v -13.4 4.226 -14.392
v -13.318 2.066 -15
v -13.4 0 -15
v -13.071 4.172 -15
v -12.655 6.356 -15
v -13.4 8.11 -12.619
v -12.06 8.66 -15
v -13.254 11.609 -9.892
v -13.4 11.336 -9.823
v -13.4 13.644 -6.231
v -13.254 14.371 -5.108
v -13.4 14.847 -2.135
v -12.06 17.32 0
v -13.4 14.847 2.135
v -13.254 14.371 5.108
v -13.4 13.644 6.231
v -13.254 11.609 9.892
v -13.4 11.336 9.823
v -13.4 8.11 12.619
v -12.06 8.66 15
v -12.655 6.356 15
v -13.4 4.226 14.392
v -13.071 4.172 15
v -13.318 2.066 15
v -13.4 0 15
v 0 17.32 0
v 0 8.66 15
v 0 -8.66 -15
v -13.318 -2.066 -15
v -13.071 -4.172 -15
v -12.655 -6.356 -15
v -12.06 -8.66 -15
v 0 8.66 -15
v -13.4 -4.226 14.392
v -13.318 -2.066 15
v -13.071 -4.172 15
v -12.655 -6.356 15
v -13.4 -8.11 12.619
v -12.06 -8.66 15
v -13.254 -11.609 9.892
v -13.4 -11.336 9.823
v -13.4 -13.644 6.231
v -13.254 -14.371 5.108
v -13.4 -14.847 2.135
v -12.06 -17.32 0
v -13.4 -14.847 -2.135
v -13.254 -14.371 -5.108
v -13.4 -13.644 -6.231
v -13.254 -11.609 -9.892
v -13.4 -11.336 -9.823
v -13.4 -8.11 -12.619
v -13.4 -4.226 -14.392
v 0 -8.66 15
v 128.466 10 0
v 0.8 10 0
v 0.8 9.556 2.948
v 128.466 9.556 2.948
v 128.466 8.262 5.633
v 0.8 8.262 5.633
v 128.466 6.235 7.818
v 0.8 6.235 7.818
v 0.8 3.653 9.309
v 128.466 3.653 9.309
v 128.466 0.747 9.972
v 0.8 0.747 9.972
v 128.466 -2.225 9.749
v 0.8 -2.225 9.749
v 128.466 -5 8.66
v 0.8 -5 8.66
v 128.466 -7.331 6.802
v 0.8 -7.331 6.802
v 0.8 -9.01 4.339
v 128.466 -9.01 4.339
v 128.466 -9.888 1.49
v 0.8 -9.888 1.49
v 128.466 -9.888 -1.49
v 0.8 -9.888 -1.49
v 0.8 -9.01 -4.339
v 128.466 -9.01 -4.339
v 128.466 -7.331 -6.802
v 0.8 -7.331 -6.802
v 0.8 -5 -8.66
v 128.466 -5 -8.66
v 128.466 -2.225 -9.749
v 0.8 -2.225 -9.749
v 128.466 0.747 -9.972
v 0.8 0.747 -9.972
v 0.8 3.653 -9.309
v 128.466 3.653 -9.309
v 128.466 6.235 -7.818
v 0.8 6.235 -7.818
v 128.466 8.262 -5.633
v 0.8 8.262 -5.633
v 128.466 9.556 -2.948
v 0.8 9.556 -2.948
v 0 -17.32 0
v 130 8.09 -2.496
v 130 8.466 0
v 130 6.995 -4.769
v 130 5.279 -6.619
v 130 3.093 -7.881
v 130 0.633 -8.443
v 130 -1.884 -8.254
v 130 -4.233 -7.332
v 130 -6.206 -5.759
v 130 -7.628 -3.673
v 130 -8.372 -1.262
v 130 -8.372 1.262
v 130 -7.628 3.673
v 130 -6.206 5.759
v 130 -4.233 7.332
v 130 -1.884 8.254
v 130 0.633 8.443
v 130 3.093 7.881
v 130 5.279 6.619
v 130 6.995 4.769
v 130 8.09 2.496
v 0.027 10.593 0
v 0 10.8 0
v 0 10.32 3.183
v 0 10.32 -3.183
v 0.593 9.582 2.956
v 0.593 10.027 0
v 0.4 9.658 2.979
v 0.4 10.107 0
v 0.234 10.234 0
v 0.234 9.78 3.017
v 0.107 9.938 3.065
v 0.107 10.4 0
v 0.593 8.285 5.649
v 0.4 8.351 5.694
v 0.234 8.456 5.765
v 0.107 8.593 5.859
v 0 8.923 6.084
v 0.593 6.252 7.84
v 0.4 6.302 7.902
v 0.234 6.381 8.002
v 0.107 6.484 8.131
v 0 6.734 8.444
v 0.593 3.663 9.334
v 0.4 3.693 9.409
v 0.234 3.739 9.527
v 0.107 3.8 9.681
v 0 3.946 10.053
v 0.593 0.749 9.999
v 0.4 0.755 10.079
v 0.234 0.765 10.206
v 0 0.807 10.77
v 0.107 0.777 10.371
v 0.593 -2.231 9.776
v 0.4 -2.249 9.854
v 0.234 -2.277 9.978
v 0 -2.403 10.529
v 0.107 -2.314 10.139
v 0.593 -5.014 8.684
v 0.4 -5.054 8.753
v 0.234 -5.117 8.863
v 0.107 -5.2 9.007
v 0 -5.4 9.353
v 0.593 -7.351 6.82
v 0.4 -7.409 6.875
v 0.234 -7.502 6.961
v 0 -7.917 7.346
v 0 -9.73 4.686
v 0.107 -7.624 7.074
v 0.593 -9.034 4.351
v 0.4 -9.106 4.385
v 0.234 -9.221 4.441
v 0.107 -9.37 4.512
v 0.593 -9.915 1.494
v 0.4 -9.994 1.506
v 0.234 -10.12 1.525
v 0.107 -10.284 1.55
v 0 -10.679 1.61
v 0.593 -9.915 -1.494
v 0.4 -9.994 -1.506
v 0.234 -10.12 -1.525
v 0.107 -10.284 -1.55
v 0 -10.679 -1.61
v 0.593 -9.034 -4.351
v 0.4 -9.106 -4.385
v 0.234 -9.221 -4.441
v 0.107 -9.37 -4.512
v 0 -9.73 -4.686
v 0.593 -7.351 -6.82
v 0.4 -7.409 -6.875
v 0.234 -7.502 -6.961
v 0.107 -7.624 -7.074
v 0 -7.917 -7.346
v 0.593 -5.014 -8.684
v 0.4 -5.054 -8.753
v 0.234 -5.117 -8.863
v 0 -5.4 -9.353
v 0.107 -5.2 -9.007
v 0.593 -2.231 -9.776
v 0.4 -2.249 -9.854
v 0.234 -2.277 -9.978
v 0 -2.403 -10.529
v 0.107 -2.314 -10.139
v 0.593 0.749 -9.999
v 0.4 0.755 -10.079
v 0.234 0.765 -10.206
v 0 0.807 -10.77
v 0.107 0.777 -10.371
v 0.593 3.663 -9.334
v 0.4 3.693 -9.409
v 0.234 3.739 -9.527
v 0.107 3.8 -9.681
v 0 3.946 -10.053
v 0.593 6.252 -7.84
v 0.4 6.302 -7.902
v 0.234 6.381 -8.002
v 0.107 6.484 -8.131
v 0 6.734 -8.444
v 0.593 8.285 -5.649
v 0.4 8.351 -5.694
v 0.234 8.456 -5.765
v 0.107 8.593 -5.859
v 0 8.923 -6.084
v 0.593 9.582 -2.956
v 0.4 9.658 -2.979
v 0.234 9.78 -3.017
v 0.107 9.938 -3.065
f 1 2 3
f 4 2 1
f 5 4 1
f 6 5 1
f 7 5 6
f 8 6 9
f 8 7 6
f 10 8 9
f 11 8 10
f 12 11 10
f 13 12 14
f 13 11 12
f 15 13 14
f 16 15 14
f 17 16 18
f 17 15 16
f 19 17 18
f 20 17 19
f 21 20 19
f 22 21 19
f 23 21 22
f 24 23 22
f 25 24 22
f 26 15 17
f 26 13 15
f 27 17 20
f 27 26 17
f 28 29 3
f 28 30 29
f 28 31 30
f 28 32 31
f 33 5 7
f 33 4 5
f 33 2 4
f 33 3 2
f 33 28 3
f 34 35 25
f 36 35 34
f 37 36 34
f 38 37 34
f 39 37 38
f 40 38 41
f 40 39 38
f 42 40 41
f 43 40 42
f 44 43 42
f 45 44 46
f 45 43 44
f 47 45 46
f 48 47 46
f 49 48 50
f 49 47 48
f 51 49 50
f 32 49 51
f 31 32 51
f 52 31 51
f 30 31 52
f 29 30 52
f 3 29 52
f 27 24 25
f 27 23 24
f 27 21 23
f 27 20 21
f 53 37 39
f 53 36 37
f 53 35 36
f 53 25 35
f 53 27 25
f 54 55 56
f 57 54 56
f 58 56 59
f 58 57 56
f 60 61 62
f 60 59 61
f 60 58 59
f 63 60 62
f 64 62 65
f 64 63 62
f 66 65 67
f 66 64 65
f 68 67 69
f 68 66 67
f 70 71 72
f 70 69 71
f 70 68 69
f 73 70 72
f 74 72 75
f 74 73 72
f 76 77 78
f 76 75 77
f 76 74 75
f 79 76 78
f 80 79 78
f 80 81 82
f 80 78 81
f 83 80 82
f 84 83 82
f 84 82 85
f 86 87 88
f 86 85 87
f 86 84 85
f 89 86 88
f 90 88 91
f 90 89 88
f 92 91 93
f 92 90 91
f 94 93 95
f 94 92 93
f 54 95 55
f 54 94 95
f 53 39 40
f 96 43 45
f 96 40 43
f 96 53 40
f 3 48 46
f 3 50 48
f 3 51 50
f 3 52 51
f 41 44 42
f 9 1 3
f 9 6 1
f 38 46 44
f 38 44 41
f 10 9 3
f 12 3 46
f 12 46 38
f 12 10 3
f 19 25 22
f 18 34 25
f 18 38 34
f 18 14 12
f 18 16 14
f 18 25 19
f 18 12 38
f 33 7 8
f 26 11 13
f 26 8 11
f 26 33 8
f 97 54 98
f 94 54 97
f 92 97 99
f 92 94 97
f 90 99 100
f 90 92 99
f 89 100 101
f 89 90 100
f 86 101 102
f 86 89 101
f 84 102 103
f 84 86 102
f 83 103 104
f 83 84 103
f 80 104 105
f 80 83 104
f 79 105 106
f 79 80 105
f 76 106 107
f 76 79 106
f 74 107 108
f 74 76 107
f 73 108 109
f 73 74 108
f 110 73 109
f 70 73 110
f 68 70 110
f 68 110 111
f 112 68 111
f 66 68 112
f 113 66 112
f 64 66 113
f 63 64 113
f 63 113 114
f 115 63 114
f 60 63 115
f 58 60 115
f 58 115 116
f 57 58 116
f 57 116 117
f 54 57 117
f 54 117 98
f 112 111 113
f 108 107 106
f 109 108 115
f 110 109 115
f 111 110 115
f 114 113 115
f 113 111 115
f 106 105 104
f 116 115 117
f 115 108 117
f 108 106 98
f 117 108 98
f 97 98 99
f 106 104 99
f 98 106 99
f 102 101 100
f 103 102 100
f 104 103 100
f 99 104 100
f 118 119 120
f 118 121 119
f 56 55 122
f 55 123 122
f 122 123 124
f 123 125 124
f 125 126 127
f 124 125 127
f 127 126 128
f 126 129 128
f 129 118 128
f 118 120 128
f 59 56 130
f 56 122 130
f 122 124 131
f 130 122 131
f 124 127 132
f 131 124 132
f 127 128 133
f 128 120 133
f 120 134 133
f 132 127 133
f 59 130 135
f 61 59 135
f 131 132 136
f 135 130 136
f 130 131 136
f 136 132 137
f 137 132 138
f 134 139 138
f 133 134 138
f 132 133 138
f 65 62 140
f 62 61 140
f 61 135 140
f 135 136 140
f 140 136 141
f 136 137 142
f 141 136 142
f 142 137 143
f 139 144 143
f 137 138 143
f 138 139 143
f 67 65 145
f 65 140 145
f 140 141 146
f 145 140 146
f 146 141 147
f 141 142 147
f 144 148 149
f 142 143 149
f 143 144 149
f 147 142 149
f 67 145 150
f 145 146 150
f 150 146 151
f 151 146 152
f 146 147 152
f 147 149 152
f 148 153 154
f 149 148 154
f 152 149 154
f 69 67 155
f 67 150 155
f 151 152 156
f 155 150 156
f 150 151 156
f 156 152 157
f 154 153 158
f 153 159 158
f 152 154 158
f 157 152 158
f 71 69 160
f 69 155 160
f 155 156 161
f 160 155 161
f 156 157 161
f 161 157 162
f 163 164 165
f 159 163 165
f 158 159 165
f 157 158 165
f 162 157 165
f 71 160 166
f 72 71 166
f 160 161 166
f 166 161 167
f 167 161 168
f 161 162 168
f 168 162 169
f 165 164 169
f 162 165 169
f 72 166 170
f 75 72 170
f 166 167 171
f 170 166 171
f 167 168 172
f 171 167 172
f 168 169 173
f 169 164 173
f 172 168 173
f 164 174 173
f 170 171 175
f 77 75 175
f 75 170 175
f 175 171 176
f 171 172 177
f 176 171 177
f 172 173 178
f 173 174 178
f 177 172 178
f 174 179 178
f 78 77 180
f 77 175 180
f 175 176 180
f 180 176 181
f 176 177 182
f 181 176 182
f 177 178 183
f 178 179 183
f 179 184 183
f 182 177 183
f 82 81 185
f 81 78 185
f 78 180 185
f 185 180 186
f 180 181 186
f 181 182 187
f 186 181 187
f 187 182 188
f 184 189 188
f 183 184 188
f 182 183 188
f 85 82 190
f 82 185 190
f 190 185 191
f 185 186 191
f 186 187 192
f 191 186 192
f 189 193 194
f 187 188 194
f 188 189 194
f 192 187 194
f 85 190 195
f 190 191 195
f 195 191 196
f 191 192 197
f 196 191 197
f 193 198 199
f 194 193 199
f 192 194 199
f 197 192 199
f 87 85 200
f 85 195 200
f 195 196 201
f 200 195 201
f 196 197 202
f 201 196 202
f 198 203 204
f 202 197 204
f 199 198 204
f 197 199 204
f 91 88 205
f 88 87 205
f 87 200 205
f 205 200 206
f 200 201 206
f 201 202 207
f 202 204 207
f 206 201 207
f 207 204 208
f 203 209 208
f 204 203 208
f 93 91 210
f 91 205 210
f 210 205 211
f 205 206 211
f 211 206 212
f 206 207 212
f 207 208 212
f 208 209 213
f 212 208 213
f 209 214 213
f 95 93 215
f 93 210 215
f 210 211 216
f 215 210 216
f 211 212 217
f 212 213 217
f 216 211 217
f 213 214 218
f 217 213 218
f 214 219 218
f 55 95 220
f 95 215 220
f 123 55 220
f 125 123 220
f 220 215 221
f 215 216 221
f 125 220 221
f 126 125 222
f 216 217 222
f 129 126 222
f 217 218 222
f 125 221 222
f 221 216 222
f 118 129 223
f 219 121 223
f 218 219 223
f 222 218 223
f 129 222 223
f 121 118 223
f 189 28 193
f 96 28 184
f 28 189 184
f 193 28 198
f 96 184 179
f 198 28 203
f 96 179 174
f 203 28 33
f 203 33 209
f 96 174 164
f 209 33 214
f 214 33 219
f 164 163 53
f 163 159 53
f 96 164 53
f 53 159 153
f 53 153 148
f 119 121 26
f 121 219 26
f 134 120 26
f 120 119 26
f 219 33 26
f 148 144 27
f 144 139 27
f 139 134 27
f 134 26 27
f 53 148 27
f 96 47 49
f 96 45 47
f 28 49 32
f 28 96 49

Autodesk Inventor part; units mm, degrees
ref_plane "YZ Plane" through (0, 0, 0) normal (1, 0, 0) x (0, 1, 0)
ref_plane "XZ Plane" through (0, 0, 0) normal (0, 1, 0) x (-1, 0, 0)
sketch "Sketch1" plane through (0, 0, 0) normal (0, 0, 1) x (1, 0, 0)
  line L0 (0, 10) -> (130, 10)
  line L1 (130, 10) -> (130, 0)
  line L2 (130, 0) -> (0, 0)
  line L3 (-26, 0) -> (156, 0) projected
  line L4 (0, -2) -> (0, 12) projected
  line L5 (0, 10) -> (0, 0)
  dimension "d2" = 20
  dimension "d59" = 130
revolve "Body" add sketch "Sketch1" angle 360 about axis through (130, 0, 0) along (-1, 0, 0)
sketch "Sketch2" plane through (0, 0, 0) normal (-1, 0, 0) x (0, 0, 1)
  line L0 (0, 17.3205) -> (15, 8.6603)
  line L1 (15, 8.6603) -> (15, -8.6603)
  line L2 (15, -8.6603) -> (0, -17.3205)
  line L3 (0, -17.3205) -> (-15, -8.6603)
  line L4 (-15, -8.6603) -> (-15, 8.6603)
  line L5 (-15, 8.6603) -> (0, 17.3205)
  line L6 (-21, 0) -> (21, 0) projected
  line L7 (0, 24.2487) -> (0, -24.2487) projected
  point P0 (0, 0)
  point P1 (0, 0)
  dimension "d11" = 30
extrude "Head" add sketch "Sketch2" along normal blind 13.4
sketch "Sketch4" plane through (0, 0, 0) normal (0, 0, 1) x (1, 0, 0)
  line L0 (-11.6679, 18) -> (-13.4, 15)
  line L1 (-1.1, 0) -> (-0.234, 0)
  line L2 (-16.0332, 0) -> (2.3992, 0) projected
  line L3 (-13.4, 18) -> (-11.6679, 18)
  line L4 (-13.4, 15) -> (-13.4, 18)
  line L5 (0, 21.6) -> (0, -3.6) projected
  dimension "d65" = 30
  dimension "d67" = 30
  dimension "d68" = 36
  dimension "d69" = 13.4
revolve "Chamfer1" cut sketch "Sketch4" angle 360 about axis through (-1.1, 0, 0) along (1, 0, 0)
thread "Thread" size "M20x2.5" class "6g" standard "ISO Metric profile" length 52
chamfer "Chamfer2" distance 1.5336 distance2 1.5337 1 edges at (130, -10, 0) measured on face at (130, -2.6738, -2.9356)
fillet "Fillet" radius 0.8 1 edges at (0, -10, 0)
ref_plane "Work Plane1" through (1.525, 0, 0) normal (0, 0, 1) x (1, 0, 0)
equation "\"d2\" = GD"
equation "\"d59\" = NLG"
equation "\"d11\" = SW"
equation "\"d3\" = KOH"
equation "\"d15\" = GEL"
equation "\"d6\" = -0.5 * SPD + 0.5 * GD"
equation "\"d71\" = RR1"
equation "\"d65\" = SW"
equation "\"d67\" = ANG1"
equation "\"d68\" = 1.2 * SW"
equation "\"d69\" = KOH"
equation "\"NLG\" = 130"
equation "\"GD\" = NND"
equation "\"KOH\" = 13.4"
equation "\"GEL\" = 52"
equation "\"SW\" = 30"
equation "\"SPD\" = NND - 1.2269 * PTC"
equation "\"SD\" = 0"
equation "\"ANG1\" = 30deg"
equation "\"GAL\" = 0.61345 * PTC"
equation "\"GUL\" = 0.61345 * PTC"
equation "\"RR\" = 0.1"
equation "\"RR1\" = 0.8"
equation "\"GD1\" = THREADDIA - 1.2269 * PTC"
equation "\"TOA\" = 30deg"
equation "\"PTC\" = 2.5"
equation "\"KOH1\" = 8.8"
equation "\"E0\" = 1.155 * SW"
equation "\"NND\" = 20"
equation "\"THREADDIA\" = 20"
properties part number "ANSI B18.2.3.5M - M20 x 2,5 x 130" material "Steel, Mild"
